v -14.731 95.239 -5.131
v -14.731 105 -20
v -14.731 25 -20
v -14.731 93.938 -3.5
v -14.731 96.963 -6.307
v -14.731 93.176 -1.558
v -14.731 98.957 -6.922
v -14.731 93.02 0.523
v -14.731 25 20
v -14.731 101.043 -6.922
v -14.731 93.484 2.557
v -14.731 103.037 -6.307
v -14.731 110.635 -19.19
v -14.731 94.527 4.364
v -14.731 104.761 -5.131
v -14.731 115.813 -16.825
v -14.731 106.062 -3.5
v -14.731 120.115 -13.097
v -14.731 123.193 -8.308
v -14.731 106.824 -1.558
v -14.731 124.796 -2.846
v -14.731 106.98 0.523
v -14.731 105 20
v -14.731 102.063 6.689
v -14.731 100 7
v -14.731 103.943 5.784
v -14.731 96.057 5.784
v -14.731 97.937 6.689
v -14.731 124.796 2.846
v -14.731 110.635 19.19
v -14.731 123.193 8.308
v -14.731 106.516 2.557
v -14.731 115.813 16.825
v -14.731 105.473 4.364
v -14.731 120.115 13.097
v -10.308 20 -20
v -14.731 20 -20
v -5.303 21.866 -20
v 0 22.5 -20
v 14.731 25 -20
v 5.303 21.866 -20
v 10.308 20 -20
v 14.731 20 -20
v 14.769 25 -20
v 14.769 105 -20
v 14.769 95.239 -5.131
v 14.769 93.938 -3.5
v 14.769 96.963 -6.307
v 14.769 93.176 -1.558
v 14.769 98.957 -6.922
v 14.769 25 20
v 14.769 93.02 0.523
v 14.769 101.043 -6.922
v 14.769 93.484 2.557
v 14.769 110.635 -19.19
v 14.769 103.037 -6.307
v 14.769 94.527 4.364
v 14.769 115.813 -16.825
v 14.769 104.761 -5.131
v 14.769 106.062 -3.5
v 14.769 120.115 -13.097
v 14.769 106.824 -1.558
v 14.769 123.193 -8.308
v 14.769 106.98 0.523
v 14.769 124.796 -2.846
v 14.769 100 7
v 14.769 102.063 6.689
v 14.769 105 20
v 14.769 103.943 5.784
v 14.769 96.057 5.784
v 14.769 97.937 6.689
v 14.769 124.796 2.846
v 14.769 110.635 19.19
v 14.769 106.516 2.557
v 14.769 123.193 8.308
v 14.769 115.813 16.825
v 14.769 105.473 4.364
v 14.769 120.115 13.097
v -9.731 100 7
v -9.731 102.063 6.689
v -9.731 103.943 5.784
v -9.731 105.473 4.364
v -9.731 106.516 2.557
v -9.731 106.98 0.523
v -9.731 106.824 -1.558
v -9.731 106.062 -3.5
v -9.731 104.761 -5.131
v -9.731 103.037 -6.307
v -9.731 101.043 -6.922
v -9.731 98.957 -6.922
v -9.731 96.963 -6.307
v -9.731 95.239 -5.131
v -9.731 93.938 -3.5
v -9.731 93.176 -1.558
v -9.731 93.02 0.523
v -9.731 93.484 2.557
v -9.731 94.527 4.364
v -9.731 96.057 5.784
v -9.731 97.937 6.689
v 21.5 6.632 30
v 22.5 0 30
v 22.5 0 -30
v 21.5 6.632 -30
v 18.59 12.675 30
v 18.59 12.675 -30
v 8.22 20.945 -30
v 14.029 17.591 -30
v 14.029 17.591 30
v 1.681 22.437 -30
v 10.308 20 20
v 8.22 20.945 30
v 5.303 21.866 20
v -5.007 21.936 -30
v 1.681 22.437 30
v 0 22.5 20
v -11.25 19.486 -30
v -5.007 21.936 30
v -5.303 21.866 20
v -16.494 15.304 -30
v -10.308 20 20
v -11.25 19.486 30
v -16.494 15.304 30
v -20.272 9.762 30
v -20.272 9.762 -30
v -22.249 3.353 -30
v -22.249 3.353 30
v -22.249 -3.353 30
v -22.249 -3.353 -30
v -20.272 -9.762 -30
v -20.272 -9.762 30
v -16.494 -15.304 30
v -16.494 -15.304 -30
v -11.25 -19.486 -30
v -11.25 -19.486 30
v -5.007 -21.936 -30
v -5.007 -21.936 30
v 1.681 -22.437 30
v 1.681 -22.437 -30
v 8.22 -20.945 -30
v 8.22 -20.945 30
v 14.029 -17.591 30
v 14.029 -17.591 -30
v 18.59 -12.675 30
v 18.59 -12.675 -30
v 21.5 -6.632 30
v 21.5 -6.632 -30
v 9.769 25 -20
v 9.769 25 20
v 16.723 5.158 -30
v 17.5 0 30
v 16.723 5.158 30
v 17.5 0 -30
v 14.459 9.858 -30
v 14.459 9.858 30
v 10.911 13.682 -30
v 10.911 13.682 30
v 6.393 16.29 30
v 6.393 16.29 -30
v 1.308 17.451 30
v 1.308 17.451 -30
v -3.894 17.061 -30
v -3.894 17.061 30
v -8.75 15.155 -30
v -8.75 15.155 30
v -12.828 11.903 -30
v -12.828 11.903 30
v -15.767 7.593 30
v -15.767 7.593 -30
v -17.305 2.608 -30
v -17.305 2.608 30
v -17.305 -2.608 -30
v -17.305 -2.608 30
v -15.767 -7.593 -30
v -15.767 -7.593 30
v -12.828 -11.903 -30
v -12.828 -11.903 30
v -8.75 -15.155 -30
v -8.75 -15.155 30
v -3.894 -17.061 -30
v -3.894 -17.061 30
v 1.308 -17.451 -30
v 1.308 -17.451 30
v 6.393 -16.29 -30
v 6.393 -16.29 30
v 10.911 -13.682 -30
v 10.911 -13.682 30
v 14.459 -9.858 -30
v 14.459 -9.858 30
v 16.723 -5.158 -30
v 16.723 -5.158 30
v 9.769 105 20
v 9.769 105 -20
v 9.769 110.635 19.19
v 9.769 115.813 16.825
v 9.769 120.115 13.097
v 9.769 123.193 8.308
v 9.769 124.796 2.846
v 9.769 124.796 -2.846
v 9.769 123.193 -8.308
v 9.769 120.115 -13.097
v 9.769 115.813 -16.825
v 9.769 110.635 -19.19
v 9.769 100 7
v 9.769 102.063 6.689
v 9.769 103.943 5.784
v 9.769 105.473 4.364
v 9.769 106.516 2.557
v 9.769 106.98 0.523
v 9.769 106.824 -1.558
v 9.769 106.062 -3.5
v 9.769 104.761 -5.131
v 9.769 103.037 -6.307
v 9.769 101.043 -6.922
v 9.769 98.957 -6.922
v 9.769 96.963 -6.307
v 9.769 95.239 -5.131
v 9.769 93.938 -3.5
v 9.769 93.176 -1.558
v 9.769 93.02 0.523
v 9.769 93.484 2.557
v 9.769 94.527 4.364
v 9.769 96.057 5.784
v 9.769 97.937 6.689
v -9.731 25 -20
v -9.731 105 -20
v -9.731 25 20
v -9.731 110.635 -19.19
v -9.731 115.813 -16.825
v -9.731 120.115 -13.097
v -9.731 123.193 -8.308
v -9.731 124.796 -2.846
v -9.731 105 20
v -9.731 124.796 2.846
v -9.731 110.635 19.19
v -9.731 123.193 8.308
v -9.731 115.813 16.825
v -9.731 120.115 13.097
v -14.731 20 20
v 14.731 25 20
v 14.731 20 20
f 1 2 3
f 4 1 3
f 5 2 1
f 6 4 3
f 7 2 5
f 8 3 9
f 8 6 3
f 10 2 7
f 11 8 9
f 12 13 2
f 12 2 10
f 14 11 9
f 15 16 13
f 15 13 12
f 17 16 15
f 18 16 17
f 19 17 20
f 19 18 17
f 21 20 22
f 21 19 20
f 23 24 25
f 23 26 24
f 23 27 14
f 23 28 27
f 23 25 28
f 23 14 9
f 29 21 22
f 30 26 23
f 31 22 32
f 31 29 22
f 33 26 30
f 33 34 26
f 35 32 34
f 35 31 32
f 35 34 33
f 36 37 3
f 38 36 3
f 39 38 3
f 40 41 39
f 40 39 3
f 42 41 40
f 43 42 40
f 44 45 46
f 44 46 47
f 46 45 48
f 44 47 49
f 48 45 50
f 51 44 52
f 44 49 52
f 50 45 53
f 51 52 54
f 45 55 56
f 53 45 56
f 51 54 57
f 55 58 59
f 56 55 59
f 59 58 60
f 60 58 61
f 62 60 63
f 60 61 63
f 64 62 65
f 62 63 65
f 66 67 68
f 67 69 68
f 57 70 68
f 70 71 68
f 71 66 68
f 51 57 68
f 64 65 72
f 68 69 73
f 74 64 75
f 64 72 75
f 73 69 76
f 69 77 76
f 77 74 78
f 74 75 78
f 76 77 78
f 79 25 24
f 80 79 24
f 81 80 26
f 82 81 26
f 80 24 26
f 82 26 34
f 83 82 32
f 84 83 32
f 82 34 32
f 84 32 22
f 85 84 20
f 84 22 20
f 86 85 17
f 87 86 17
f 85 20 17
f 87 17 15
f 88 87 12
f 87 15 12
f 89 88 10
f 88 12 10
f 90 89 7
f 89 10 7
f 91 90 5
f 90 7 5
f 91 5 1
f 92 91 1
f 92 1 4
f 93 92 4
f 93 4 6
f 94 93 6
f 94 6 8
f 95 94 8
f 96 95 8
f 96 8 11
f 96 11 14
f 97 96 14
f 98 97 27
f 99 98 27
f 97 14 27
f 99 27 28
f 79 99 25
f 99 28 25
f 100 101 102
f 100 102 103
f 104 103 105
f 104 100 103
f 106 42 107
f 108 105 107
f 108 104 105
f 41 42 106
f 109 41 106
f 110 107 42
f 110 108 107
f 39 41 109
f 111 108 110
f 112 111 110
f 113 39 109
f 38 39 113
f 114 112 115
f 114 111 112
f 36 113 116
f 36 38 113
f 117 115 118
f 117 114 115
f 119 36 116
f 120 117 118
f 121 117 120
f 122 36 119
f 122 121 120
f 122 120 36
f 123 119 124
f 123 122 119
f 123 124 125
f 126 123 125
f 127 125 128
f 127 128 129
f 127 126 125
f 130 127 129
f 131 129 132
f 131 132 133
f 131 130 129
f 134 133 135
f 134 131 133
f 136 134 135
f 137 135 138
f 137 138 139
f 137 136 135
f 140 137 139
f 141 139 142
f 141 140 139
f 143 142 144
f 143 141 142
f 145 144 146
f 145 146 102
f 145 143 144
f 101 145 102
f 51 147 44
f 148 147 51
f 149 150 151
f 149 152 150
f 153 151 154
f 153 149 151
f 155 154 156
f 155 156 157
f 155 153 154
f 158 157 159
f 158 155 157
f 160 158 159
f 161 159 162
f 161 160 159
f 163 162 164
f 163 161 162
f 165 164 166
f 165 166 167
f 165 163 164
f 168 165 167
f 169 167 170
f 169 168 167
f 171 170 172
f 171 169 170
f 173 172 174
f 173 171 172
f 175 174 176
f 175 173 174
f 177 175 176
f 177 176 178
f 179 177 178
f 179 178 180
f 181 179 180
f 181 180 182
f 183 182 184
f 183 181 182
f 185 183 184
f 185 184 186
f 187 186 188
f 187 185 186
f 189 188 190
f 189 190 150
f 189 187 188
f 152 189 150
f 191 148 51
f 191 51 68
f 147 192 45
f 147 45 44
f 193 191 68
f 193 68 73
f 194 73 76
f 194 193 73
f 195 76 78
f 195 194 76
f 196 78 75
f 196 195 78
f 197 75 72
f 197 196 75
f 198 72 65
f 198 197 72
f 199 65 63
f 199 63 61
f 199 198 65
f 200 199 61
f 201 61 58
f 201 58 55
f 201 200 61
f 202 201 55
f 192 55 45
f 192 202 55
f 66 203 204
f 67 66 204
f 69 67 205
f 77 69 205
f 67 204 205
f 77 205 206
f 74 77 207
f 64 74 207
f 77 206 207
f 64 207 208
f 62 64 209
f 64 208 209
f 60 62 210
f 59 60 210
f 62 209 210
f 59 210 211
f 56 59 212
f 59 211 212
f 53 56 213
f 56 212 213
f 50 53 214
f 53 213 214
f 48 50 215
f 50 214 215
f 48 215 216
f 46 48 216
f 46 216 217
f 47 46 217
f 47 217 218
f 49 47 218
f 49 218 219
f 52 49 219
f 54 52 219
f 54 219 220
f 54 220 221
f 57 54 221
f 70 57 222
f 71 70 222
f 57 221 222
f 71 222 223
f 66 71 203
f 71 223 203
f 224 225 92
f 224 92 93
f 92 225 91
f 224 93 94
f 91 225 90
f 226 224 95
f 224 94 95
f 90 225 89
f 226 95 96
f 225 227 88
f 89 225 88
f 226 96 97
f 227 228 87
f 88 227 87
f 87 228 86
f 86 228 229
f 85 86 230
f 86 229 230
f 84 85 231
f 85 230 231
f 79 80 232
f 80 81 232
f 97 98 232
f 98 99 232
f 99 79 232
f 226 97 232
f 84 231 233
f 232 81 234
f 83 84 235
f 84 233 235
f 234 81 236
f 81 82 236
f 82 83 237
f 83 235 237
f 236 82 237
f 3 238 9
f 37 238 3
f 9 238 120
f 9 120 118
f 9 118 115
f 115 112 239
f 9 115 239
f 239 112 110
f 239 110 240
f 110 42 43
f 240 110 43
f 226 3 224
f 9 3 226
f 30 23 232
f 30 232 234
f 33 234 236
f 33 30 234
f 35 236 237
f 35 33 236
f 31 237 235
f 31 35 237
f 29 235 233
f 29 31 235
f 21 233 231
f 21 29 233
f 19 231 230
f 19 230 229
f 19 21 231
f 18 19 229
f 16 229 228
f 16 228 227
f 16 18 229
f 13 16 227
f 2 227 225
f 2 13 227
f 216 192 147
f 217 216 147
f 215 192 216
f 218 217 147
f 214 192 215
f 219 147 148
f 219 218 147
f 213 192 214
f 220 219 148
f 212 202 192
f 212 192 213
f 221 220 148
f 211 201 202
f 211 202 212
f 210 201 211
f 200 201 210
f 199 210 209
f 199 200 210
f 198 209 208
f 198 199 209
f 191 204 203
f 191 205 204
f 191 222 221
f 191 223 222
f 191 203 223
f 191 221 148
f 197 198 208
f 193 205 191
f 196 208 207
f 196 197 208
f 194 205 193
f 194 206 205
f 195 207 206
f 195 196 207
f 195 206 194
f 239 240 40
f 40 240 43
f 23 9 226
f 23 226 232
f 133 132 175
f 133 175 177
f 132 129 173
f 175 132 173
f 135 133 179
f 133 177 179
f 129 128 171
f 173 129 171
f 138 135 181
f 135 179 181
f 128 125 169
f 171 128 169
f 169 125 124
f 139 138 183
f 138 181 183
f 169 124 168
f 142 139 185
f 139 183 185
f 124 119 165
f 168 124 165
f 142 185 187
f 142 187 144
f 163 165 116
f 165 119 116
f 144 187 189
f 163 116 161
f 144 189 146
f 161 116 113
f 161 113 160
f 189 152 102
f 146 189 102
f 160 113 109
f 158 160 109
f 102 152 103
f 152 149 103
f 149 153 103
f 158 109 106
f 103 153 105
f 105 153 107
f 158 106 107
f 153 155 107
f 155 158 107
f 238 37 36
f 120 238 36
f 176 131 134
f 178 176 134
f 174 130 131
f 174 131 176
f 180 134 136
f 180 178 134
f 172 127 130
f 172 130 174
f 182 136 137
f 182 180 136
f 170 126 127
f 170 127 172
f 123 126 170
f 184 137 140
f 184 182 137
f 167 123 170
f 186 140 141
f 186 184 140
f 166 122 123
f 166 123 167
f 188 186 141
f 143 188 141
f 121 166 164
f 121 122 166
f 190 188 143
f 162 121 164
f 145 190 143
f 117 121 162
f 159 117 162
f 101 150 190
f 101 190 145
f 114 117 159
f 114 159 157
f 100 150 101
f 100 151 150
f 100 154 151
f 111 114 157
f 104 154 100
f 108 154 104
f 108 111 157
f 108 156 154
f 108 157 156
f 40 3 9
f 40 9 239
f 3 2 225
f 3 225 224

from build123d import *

# Parameters (mm, degrees)
SKETCH1_R           = 22.5
SKETCH1_R_2         = 17.5
BOSS_EXTRUDE1_DEPTH = 30
SKETCH6_W           = 29.462107424
SKETCH6_H           = 40
BOSS_EXTRUDE7_DEPTH = 5
SKETCH8_R           = 7
BOSS_EXTRUDE8_DEPTH = 5
LPATTERN2_COUNT     = 2
LPATTERN2_PITCH     = 24.5


with BuildPart() as part:
    # Sketch1 → Boss-Extrude1 (new, symmetric)
    with BuildSketch(Plane.XY):
        Circle(SKETCH1_R)
        Circle(SKETCH1_R_2, mode=Mode.SUBTRACT)
    extrude(amount=BOSS_EXTRUDE1_DEPTH, both=True)

    # Sketch6 → Boss-Extrude7 (add)
    with BuildSketch(Plane(origin=(0, 20, 0), x_dir=(1, 0, 0), z_dir=(0, 1, 0))):
        Rectangle(SKETCH6_W, SKETCH6_H)
    extrude(amount=BOSS_EXTRUDE7_DEPTH)


with BuildPart() as body_2:
    # Sketch8 → Boss-Extrude8 (new body)
    with BuildSketch(Plane.ZY.offset(14.731053712)):
        with BuildLine():
            Line((20, 25), (20, 105))
            ThreePointArc((20, 105), (0, 125), (-20, 105))
            Line((-20, 105), (-20, 25))
            Line((-20, 25), (20, 25))
        make_face()
        with Locations((0, 100)):
            Circle(SKETCH8_R, mode=Mode.SUBTRACT)
    boss_extrude8 = extrude(amount=-BOSS_EXTRUDE8_DEPTH)


with BuildPart() as lpattern2_1:
    # LPattern2: Boss-Extrude8 ×2
    with Locations(*[(i * LPATTERN2_PITCH, 0, 0) for i in range(1, LPATTERN2_COUNT)]):
        add(boss_extrude8)


solid = Compound([part.part, body_2.part, lpattern2_1.part])
